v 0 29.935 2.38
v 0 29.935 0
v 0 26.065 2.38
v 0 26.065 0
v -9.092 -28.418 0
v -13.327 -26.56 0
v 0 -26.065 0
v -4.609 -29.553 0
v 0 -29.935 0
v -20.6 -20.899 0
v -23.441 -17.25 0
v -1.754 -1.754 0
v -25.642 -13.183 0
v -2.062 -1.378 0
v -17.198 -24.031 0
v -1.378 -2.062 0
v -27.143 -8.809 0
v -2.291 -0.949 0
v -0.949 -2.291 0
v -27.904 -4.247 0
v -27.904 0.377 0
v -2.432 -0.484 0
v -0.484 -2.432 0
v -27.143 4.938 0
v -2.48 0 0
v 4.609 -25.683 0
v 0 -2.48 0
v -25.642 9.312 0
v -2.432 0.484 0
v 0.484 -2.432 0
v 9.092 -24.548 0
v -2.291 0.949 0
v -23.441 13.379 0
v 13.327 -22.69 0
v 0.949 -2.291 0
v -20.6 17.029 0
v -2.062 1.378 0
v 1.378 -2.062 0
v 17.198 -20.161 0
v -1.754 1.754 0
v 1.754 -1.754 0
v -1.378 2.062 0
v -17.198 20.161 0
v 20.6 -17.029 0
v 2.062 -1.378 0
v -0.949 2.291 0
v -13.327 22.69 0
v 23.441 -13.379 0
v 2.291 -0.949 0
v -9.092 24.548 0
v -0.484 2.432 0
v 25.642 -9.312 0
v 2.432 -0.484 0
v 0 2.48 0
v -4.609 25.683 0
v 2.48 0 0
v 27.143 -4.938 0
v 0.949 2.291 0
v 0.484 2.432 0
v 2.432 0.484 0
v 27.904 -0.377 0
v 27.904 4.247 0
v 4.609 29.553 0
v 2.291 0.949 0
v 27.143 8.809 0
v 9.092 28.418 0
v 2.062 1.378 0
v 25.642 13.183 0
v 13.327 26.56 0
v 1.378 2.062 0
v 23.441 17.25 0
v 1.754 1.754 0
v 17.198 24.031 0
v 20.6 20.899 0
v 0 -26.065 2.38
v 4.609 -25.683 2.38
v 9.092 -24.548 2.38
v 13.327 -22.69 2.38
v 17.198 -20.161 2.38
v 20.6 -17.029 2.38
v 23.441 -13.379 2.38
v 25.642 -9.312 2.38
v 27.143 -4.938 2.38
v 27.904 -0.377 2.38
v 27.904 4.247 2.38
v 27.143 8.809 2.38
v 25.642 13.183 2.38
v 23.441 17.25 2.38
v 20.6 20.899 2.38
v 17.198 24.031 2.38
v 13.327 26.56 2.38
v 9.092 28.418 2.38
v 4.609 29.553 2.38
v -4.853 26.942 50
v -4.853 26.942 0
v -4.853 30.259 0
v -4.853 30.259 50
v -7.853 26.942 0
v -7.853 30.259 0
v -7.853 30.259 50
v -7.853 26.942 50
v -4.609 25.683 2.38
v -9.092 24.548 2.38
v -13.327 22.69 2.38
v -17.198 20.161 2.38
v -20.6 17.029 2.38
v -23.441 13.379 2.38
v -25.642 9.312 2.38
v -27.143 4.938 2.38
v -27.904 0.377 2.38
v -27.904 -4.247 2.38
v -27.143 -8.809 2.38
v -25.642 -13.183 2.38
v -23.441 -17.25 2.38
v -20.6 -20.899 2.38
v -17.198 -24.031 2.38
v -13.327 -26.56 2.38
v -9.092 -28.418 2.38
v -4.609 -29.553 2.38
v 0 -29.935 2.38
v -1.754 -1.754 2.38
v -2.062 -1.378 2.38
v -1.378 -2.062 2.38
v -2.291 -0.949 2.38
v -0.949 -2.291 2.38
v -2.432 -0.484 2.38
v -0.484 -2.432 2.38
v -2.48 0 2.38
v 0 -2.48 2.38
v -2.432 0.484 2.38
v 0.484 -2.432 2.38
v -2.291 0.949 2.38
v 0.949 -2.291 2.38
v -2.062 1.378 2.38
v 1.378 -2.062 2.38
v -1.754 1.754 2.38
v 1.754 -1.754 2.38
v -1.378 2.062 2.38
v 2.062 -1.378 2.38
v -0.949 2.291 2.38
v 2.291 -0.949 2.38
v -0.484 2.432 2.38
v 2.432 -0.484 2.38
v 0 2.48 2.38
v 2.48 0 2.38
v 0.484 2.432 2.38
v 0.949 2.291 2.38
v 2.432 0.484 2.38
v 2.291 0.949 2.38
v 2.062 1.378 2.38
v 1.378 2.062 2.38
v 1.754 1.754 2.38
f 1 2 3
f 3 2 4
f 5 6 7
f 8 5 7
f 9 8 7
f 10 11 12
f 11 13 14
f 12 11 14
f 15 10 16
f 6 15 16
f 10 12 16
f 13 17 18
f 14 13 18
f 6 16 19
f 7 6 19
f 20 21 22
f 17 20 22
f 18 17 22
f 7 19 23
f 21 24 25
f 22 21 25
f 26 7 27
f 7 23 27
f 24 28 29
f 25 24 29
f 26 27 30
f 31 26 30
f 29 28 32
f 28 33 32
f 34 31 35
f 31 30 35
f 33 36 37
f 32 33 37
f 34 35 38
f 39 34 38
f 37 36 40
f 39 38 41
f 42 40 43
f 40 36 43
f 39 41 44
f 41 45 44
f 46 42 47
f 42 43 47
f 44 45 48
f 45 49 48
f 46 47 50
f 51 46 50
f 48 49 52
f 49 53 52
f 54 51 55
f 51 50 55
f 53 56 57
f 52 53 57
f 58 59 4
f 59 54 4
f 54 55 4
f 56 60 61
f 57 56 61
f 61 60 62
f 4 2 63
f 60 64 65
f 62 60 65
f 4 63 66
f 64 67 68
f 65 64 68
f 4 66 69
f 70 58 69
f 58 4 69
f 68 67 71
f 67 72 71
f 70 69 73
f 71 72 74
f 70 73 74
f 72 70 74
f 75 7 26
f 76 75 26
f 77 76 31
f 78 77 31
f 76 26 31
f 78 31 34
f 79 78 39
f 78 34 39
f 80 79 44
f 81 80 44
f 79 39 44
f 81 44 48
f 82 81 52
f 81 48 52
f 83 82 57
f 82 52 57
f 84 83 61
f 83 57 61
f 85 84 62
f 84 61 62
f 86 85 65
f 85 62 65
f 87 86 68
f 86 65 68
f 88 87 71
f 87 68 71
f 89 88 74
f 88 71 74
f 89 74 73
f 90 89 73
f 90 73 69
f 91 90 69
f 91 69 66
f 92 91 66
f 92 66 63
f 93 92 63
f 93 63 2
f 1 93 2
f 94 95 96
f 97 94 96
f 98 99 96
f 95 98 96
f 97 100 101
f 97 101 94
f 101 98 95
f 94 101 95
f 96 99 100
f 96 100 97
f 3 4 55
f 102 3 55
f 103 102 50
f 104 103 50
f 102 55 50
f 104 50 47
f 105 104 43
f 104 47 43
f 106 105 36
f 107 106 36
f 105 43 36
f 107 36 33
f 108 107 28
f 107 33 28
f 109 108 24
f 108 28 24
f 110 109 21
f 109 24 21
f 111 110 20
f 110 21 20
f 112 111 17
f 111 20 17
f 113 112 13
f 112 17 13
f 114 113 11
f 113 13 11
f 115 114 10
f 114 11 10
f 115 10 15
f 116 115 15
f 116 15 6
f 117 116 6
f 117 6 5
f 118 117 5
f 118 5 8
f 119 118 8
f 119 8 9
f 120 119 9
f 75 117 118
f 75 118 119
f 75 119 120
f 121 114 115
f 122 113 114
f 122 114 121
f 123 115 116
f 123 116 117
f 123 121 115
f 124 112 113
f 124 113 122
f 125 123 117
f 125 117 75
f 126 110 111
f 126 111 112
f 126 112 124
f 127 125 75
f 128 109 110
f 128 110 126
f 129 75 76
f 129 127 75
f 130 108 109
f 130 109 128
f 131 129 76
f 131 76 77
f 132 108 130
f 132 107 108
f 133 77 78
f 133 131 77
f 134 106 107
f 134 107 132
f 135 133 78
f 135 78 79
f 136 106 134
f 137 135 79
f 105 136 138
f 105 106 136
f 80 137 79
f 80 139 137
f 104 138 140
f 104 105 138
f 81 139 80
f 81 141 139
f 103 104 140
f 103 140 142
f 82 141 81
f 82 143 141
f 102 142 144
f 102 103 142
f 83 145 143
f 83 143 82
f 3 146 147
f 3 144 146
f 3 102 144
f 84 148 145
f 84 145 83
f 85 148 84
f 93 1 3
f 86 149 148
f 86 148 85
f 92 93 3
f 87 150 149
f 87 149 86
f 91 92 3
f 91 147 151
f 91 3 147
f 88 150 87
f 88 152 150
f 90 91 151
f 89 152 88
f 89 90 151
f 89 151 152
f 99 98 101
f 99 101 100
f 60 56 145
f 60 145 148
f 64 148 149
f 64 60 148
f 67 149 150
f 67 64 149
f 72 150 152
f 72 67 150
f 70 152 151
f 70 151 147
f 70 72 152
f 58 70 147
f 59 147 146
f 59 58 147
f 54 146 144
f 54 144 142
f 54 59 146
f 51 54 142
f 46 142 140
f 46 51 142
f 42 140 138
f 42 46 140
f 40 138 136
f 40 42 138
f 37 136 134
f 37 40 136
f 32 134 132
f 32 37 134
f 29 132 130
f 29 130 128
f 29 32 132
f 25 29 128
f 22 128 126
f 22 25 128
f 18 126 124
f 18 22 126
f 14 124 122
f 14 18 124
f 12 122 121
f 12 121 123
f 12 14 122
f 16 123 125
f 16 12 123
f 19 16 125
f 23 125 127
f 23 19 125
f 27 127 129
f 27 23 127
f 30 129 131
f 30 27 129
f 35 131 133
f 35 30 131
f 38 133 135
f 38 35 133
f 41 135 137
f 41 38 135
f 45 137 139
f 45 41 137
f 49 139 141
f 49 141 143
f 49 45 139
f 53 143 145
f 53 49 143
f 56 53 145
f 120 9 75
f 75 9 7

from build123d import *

# Parameters (mm, degrees)
F0_R     = 2.48
F1_DEPTH = 2.38
F0_W     = 3
F0_H     = 3.317181
F2_DEPTH = 50


with BuildPart() as f1:
    # F0 (on Top) → F1 (new body)
    with BuildSketch(Plane.XY):
        with BuildLine():
            ThreePointArc((0, -26.064767), (18.430573, -18.430573), (26.064767, 0))
            ThreePointArc((26.064767, 0), (18.430573, 18.430573), (0, 26.064767))
            ThreePointArc((0, 26.064767), (-26.064767, 0), (0, -26.064767))
        make_face()
        Circle(F0_R, mode=Mode.SUBTRACT)
        with BuildLine():
            ThreePointArc((0, -26.064767), (-26.064767, 0), (0, 26.064767))
            ThreePointArc((0, 26.064767), (-28, -1.935233), (0, -29.935233))
            Line((0, -29.935233), (0, -26.064767))
        make_face()
        with BuildLine():
            ThreePointArc((0, 26.064767), (18.430573, 18.430573), (26.064767, 0))
            ThreePointArc((26.064767, 0), (18.430573, -18.430573), (0, -26.064767))
            ThreePointArc((0, -26.064767), (28, 1.935233), (0, 29.935233))
            Line((0, 29.935233), (0, 26.064767))
        make_face()
    extrude(amount=F1_DEPTH)


with BuildPart() as f2:
    # F0 (on Top) → F2 (new body)
    with BuildSketch(Plane.XY):
        with Locations((-6.352668, 28.600418)):
            Rectangle(F0_W, F0_H)
    extrude(amount=F2_DEPTH)


solid = Compound([f1.part, f2.part])
